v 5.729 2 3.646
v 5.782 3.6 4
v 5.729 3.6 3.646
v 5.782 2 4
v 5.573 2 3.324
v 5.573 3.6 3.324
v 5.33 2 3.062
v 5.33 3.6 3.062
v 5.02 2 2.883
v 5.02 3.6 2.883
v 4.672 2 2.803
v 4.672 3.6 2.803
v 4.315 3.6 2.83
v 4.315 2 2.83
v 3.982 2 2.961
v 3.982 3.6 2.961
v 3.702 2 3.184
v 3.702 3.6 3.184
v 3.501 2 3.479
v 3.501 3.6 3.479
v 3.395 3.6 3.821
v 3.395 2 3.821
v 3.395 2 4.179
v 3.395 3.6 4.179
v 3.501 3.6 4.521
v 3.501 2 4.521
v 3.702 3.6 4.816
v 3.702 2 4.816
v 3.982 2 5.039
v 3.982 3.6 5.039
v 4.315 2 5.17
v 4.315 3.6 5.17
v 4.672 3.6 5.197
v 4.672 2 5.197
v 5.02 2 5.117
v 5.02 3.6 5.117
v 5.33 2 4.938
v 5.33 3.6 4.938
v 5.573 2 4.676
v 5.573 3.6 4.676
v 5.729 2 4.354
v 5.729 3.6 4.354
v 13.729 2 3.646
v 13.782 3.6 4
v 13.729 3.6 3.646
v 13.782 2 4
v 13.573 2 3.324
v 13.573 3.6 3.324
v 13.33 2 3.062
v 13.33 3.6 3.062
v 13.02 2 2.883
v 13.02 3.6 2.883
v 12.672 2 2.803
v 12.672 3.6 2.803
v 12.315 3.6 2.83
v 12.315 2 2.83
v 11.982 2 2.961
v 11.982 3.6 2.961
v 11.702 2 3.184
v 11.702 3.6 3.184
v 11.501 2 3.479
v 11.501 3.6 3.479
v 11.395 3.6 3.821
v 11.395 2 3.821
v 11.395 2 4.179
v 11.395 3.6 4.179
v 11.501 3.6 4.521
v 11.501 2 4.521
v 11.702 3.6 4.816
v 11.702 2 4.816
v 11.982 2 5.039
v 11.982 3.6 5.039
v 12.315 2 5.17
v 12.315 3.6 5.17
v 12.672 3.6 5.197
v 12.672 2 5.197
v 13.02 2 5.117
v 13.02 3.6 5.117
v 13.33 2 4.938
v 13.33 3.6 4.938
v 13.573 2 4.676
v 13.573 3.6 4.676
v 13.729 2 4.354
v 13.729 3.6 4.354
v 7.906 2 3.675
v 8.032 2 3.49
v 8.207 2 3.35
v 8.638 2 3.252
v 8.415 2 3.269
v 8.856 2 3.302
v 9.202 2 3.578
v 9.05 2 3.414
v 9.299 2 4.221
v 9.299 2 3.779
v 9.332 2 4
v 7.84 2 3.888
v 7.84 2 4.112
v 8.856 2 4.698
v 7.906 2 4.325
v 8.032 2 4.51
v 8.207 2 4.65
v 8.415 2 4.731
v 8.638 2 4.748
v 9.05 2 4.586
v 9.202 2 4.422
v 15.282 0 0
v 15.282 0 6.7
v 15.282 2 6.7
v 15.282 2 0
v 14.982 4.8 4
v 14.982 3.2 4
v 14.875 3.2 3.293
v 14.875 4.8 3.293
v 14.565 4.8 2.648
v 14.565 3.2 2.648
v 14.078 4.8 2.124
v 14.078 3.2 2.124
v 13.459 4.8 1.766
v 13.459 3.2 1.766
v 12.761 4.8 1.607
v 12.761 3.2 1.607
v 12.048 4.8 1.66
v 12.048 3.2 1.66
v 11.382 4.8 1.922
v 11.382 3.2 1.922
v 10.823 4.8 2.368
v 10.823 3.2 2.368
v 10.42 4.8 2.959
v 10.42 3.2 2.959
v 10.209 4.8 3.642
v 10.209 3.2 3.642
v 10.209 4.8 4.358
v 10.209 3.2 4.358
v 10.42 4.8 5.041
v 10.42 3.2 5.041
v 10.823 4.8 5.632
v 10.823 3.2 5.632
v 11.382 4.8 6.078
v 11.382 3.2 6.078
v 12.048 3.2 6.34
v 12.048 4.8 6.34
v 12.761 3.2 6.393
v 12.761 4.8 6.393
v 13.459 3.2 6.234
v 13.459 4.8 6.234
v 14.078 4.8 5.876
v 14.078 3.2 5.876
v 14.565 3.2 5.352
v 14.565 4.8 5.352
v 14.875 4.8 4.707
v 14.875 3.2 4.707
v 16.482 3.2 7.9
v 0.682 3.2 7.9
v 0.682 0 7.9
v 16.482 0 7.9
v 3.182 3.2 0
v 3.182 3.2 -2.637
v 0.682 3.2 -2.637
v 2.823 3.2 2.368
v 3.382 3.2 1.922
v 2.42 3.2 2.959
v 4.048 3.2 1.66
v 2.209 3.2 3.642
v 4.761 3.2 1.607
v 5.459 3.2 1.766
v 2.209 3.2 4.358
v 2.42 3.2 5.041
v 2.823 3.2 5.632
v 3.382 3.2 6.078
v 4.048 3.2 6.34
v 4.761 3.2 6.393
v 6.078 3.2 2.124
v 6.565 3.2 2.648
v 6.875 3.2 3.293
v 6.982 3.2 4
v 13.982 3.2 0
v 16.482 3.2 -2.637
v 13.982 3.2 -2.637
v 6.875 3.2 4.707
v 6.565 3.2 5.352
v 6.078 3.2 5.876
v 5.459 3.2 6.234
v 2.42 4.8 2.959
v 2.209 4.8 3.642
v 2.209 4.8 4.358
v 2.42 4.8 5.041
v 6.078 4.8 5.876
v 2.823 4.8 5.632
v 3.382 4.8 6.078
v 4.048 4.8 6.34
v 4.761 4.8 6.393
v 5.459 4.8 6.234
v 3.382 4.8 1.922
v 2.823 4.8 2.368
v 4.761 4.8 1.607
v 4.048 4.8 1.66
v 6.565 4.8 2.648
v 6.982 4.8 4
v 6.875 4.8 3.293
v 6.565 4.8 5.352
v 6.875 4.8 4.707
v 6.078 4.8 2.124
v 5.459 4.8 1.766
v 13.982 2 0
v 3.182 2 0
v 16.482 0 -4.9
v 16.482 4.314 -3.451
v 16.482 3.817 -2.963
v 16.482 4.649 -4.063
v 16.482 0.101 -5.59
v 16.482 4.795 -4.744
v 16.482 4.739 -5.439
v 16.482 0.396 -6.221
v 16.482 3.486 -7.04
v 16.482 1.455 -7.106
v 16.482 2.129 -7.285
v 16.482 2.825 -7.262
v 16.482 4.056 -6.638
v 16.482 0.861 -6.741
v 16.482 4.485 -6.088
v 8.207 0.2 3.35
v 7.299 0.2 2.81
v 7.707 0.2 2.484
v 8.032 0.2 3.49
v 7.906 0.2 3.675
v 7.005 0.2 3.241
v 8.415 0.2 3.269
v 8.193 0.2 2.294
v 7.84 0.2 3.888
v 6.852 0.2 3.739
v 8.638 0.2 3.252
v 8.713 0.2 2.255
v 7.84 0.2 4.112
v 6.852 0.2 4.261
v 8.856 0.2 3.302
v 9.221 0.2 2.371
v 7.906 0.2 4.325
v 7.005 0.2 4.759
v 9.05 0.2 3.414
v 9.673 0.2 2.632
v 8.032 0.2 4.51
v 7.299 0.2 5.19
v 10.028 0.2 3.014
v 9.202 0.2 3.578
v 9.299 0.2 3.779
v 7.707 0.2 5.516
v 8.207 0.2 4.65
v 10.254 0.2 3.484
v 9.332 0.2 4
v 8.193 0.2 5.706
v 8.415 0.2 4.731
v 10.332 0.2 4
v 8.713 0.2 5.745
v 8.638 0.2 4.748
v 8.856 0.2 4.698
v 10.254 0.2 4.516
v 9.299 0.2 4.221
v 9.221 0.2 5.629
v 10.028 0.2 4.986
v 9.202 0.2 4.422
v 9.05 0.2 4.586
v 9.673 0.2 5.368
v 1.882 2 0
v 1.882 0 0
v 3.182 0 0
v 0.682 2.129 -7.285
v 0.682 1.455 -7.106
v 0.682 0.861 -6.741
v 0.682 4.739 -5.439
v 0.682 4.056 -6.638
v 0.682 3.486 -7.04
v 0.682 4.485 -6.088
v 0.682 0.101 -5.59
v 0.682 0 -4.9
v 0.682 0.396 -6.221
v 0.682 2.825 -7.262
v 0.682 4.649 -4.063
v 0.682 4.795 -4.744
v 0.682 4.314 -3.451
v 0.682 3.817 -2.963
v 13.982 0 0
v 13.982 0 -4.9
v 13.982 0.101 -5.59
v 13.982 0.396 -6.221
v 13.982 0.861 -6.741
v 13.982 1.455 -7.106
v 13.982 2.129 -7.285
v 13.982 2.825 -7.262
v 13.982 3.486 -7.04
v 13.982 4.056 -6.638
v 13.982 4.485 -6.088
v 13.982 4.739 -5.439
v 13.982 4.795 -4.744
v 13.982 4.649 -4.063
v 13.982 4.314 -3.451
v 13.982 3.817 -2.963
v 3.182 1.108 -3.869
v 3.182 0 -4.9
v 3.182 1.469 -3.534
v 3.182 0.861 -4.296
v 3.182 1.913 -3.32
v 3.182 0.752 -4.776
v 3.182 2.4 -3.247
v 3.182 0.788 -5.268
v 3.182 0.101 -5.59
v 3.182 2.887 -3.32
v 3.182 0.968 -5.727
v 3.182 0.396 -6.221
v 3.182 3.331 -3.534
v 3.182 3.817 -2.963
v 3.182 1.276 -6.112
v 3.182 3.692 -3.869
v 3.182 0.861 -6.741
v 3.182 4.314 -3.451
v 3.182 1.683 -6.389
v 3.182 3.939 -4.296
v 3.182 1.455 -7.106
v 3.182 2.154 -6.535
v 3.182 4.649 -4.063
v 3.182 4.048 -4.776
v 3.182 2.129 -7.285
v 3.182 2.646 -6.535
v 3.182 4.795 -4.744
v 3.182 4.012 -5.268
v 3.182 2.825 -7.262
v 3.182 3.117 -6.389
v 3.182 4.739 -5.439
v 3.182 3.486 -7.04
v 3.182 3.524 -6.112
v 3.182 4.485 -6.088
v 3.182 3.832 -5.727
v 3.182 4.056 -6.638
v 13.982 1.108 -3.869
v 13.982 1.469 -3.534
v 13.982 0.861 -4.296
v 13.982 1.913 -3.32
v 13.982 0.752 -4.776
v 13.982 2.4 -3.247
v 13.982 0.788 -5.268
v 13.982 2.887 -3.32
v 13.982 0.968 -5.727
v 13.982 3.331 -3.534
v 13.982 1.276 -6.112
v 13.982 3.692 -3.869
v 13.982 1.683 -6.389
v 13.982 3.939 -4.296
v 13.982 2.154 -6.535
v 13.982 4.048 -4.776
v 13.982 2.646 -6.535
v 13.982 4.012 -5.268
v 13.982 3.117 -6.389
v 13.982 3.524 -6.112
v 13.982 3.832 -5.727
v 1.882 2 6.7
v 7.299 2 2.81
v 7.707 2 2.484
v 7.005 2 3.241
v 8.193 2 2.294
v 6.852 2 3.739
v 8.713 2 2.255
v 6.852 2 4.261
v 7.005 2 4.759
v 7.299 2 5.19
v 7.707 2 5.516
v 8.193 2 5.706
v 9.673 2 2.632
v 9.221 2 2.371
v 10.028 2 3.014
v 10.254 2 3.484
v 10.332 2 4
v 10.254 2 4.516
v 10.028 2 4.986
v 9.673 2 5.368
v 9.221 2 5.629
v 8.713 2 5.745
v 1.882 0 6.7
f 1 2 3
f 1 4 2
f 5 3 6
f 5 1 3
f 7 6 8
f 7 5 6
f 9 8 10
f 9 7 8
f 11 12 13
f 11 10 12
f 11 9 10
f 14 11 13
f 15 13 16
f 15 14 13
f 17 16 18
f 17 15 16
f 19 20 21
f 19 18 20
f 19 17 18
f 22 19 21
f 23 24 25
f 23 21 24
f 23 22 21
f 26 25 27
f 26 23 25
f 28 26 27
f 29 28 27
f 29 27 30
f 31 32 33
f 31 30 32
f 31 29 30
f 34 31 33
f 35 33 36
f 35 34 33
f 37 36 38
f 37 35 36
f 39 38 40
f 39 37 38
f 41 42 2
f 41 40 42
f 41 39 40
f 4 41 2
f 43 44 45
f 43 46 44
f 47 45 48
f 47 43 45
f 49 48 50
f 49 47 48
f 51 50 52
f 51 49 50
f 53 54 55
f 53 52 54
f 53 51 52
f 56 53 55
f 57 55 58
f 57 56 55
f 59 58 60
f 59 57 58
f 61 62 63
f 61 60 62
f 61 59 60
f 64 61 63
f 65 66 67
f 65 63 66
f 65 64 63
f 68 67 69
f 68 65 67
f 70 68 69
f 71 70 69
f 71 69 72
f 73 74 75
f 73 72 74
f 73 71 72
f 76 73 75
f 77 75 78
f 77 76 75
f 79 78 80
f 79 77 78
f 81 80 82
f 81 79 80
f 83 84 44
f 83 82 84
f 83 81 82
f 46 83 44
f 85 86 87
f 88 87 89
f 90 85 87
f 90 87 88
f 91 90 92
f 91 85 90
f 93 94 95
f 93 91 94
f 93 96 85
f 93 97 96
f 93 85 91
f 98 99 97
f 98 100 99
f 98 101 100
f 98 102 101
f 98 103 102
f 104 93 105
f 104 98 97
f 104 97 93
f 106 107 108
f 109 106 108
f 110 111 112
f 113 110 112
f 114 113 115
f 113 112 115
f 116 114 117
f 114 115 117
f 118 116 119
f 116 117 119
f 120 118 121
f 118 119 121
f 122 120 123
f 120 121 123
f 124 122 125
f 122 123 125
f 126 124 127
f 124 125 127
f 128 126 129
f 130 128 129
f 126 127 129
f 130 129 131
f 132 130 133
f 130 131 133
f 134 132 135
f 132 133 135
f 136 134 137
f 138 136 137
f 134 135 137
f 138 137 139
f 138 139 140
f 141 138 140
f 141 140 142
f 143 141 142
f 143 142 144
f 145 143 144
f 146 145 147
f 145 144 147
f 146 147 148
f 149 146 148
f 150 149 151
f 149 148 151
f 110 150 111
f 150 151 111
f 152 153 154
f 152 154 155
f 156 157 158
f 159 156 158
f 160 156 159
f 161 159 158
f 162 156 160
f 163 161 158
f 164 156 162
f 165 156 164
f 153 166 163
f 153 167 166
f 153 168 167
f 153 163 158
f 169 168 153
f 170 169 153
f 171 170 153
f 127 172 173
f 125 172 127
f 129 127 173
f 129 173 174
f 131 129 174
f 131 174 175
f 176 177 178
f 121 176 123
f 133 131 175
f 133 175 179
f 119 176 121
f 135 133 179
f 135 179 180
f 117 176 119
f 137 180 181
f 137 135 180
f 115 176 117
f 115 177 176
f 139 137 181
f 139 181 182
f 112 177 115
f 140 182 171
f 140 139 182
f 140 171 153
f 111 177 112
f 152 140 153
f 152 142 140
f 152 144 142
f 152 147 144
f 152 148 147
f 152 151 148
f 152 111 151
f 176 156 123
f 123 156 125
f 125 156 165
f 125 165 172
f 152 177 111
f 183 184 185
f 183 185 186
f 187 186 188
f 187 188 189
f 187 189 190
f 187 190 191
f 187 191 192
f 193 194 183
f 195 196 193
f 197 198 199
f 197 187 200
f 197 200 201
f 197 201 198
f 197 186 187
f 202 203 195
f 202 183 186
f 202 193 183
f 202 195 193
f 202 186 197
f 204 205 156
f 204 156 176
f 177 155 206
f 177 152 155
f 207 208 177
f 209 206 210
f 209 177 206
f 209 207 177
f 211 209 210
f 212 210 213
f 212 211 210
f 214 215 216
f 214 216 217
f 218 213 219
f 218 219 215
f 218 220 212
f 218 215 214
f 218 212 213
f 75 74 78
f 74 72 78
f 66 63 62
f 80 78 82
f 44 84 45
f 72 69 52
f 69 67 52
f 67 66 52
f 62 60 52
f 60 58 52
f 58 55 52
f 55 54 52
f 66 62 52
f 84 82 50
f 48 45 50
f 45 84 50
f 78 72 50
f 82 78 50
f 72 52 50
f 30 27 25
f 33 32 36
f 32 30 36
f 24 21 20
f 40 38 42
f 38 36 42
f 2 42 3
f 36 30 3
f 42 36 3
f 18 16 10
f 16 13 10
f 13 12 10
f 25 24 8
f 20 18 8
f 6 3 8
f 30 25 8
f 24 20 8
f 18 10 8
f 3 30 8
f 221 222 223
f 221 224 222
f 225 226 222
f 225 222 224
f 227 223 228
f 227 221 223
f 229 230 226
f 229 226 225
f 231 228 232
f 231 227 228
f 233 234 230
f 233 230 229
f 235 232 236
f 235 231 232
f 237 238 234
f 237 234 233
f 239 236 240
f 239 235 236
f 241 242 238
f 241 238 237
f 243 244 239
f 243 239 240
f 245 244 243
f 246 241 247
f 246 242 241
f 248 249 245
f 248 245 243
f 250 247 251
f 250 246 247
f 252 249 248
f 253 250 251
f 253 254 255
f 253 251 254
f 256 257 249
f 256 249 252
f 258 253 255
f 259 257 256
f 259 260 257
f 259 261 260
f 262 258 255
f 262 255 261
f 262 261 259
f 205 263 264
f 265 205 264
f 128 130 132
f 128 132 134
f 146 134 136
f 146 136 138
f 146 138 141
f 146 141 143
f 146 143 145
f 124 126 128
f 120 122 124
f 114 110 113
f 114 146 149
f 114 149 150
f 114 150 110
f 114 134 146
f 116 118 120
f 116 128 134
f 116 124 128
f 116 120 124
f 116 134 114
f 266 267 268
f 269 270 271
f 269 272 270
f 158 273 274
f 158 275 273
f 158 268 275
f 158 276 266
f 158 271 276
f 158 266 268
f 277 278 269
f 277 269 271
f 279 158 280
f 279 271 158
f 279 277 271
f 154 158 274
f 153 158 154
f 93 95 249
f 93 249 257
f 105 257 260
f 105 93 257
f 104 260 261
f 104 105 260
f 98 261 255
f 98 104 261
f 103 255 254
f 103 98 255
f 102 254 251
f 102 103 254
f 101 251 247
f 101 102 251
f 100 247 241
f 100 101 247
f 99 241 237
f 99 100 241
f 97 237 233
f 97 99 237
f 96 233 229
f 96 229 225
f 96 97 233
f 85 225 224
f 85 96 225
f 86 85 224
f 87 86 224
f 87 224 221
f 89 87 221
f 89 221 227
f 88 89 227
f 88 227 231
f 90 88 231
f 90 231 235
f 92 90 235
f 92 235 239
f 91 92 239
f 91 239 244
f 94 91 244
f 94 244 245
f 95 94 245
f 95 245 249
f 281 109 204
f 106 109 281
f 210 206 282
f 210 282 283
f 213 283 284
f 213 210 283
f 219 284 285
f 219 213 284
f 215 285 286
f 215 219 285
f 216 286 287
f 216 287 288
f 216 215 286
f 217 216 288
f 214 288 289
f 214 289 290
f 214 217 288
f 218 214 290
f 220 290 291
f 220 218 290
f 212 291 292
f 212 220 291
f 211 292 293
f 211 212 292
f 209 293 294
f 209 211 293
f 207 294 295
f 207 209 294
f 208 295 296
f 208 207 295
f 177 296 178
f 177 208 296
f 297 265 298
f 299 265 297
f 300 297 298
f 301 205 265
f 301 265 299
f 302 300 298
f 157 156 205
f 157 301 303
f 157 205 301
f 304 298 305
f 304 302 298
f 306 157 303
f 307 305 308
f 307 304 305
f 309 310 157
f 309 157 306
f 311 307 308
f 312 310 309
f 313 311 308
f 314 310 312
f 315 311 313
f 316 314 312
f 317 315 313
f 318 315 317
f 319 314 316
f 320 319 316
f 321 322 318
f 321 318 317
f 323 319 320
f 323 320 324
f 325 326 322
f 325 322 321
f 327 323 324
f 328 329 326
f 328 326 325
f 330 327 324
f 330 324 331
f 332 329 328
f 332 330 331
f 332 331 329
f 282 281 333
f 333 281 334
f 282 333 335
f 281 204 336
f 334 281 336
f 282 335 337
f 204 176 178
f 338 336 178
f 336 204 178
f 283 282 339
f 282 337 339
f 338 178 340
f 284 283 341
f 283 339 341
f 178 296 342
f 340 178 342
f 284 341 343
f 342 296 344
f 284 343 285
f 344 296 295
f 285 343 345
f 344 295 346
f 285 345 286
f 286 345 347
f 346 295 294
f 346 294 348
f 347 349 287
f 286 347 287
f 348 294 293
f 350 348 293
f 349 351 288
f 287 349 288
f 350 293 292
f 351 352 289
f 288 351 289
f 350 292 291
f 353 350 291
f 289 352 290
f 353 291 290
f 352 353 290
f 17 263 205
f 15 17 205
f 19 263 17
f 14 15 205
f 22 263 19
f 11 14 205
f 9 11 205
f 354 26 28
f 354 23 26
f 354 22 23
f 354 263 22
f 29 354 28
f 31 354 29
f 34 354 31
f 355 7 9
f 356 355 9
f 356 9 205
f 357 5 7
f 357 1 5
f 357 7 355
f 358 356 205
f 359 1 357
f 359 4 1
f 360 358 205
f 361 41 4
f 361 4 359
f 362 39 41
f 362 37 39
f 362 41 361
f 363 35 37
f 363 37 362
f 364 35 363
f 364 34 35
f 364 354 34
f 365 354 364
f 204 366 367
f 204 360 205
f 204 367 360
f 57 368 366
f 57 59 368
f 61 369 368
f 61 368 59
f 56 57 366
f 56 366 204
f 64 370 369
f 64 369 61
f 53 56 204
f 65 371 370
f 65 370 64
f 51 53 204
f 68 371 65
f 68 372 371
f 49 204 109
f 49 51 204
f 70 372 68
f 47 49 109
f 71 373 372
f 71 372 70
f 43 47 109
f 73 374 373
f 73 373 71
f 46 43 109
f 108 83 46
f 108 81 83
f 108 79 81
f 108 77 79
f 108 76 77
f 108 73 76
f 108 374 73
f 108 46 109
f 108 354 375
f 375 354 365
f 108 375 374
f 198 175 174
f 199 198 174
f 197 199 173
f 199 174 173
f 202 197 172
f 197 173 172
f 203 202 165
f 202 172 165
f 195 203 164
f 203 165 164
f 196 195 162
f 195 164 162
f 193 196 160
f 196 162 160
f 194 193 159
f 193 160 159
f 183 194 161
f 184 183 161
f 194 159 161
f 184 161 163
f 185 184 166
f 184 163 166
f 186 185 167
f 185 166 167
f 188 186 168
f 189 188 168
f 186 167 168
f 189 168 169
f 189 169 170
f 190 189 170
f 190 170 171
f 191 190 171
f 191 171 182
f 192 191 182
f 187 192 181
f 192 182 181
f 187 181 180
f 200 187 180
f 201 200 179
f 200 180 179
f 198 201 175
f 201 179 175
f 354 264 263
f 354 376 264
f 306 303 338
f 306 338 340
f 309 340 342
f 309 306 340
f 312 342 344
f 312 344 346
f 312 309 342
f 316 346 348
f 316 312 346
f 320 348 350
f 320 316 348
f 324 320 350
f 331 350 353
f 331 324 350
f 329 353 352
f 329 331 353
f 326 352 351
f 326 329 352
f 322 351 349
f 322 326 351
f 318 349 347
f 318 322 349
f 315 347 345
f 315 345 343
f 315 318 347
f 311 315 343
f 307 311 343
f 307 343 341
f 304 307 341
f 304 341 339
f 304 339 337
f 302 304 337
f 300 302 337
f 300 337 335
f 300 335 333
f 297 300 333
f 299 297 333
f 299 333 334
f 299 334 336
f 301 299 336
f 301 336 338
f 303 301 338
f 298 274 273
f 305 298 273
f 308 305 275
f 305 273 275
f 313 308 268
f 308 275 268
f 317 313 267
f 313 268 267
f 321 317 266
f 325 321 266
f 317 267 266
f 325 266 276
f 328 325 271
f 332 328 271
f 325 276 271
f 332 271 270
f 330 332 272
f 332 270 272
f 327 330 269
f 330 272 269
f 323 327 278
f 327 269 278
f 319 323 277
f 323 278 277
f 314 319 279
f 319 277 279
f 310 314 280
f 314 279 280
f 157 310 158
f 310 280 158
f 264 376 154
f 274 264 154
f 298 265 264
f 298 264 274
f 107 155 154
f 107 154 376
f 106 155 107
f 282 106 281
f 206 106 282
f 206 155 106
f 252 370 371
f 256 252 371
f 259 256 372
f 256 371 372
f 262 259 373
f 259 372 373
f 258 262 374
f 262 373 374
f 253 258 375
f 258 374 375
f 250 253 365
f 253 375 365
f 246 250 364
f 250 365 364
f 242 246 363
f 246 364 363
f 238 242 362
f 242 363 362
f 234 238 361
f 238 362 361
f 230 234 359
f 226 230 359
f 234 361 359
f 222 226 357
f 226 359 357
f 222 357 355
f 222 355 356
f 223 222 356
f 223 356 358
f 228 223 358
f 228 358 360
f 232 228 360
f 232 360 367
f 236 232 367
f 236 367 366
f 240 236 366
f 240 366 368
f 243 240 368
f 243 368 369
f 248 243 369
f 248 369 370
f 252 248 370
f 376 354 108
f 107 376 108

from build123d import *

# Parameters (mm, degrees)
MAINBASESKETCH_W        = 15.8
MAINBASESKETCH_H        = 3.2
MAINBASEEXTRUDE_DEPTH   = 7.9
STUDSSKETCH_R           = 2.4
STUDSEXTRUDE_DEPTH      = 1.6
STUDSPATTERN_COUNT      = 2
STUDSPATTERN_PITCH      = 8
STUDSPATTERN_COUNT_DIR2 = 2
STUDSPATTERN_PITCH_DIR2 = 8
MAINBASESHELL_T         = -1.2
LCUTBLUE_DEPTH          = 19.555463972
LCUTBLUE_DEPTH_BACK     = 19.555463972
MADESLIMCUTSKETCH_W     = 7.9
MADESLIMCUTSKETCH_H     = 7.9
MADESLIMCUT_DEPTH       = 19.897228453
SLIMHOLEEXT_START       = -0.2
SLIMHOLESKETCH_R        = 1.75
SLIMHOLESKETCH_R_2      = 0.75
SLIMHOLEEXT_DEPTH       = 2
BOSS_EXTRUDE2_DEPTH     = 2.5
SKETCH80_R              = 1.653025405
BOSS_EXTRUDE3_DEPTH     = 14


with BuildPart() as part:
    # MainBaseSketch → MainBaseExtrude (new, symmetric)
    with BuildSketch(Plane.XY):
        with Locations((8.581967213, 1.6)):
            Rectangle(MAINBASESKETCH_W, MAINBASESKETCH_H)
    extrude(amount=MAINBASEEXTRUDE_DEPTH, both=True)

    # StudsSketch → StudsExtrude (add)
    with BuildSketch(Plane(origin=(0, 3.2, 0), x_dir=(1, 0, 0), z_dir=(0, 1, 0))):
        with Locations((4.581967213, 4)):
            Circle(STUDSSKETCH_R)
    studsextrude = extrude(amount=STUDSEXTRUDE_DEPTH)

    # StudsPattern: StudsExtrude 2 × 2
    with Locations(*[(j * STUDSPATTERN_PITCH_DIR2, 0, i * STUDSPATTERN_PITCH) for i in range(STUDSPATTERN_COUNT) for j in range(STUDSPATTERN_COUNT_DIR2) if (i, j) != (0, 0)]):
        add(studsextrude)

    # MainBaseShell
    mainbaseshell_openings = [part.faces().sort_by_distance(p)[0] for p in [
        (8.581967213, 0, 0),
    ]]
    offset(amount=MAINBASESHELL_T, openings=mainbaseshell_openings, kind=Kind.INTERSECTION)

    # LCUTBlueSketch → LCutBlue (cut, two sides: drawn at the far end of the back side and taken through both)
    with BuildSketch(Plane(origin=(0, 3.2, 0), x_dir=(1, 0, 0), z_dir=(0, 1, 0)).offset(-LCUTBLUE_DEPTH_BACK)):
        Polygon((8.581967213, 53.229874044), (8.581967213, 7.9), (8.581967213, 0), (16.481967213, 0), (61.811841258, 0), (125.917963912, 64.106122654), (72.688089868, 117.335996699), align=None)
    extrude(amount=LCUTBLUE_DEPTH + LCUTBLUE_DEPTH_BACK, mode=Mode.SUBTRACT)

    # MadeSlimCutSketch → MadeSlimCut (cut, through all)
    with BuildSketch(Plane.XZ):
        with Locations((4.631967213, -3.95)):
            Rectangle(MADESLIMCUTSKETCH_W, MADESLIMCUTSKETCH_H)
    extrude(amount=-MADESLIMCUT_DEPTH, mode=Mode.SUBTRACT)

    # SlimHoleSketch → SlimHoleExt (add)
    with BuildSketch(Plane.XZ.offset(-2).offset(SLIMHOLEEXT_START)):
        with Locations((8.581967213, 4)):
            Circle(SLIMHOLESKETCH_R)
        with Locations((8.581967213, 4)):
            Circle(SLIMHOLESKETCH_R_2, mode=Mode.SUBTRACT)
    extrude(amount=SLIMHOLEEXT_DEPTH)

    # Sketch78 → Boss-Extrude2 (add)
    with BuildSketch(Plane.ZY.offset(-0.681967213)):
        with BuildLine():
            Line((0, 0), (-4.9, 0))
            ThreePointArc((-4.9, 0), (-6.859591794, 3.785640646), (-2.6372583, 3.2))
            Line((-2.6372583, 3.2), (0, 3.2))
            Line((0, 3.2), (0, 0))
        make_face()
    boss_extrude2 = extrude(amount=-BOSS_EXTRUDE2_DEPTH)

    # Mirror9: Boss-Extrude2 across plane
    add(boss_extrude2.mirror(Plane.ZY.offset(-8.581967213)))

    # Sketch80 → Boss-Extrude3 (add)
    with BuildSketch(Plane.ZY.offset(-0.681967213)):
        with Locations((-4.9, 2.4)):
            Circle(SKETCH80_R)
    extrude(amount=-BOSS_EXTRUDE3_DEPTH)


solid = part.part
